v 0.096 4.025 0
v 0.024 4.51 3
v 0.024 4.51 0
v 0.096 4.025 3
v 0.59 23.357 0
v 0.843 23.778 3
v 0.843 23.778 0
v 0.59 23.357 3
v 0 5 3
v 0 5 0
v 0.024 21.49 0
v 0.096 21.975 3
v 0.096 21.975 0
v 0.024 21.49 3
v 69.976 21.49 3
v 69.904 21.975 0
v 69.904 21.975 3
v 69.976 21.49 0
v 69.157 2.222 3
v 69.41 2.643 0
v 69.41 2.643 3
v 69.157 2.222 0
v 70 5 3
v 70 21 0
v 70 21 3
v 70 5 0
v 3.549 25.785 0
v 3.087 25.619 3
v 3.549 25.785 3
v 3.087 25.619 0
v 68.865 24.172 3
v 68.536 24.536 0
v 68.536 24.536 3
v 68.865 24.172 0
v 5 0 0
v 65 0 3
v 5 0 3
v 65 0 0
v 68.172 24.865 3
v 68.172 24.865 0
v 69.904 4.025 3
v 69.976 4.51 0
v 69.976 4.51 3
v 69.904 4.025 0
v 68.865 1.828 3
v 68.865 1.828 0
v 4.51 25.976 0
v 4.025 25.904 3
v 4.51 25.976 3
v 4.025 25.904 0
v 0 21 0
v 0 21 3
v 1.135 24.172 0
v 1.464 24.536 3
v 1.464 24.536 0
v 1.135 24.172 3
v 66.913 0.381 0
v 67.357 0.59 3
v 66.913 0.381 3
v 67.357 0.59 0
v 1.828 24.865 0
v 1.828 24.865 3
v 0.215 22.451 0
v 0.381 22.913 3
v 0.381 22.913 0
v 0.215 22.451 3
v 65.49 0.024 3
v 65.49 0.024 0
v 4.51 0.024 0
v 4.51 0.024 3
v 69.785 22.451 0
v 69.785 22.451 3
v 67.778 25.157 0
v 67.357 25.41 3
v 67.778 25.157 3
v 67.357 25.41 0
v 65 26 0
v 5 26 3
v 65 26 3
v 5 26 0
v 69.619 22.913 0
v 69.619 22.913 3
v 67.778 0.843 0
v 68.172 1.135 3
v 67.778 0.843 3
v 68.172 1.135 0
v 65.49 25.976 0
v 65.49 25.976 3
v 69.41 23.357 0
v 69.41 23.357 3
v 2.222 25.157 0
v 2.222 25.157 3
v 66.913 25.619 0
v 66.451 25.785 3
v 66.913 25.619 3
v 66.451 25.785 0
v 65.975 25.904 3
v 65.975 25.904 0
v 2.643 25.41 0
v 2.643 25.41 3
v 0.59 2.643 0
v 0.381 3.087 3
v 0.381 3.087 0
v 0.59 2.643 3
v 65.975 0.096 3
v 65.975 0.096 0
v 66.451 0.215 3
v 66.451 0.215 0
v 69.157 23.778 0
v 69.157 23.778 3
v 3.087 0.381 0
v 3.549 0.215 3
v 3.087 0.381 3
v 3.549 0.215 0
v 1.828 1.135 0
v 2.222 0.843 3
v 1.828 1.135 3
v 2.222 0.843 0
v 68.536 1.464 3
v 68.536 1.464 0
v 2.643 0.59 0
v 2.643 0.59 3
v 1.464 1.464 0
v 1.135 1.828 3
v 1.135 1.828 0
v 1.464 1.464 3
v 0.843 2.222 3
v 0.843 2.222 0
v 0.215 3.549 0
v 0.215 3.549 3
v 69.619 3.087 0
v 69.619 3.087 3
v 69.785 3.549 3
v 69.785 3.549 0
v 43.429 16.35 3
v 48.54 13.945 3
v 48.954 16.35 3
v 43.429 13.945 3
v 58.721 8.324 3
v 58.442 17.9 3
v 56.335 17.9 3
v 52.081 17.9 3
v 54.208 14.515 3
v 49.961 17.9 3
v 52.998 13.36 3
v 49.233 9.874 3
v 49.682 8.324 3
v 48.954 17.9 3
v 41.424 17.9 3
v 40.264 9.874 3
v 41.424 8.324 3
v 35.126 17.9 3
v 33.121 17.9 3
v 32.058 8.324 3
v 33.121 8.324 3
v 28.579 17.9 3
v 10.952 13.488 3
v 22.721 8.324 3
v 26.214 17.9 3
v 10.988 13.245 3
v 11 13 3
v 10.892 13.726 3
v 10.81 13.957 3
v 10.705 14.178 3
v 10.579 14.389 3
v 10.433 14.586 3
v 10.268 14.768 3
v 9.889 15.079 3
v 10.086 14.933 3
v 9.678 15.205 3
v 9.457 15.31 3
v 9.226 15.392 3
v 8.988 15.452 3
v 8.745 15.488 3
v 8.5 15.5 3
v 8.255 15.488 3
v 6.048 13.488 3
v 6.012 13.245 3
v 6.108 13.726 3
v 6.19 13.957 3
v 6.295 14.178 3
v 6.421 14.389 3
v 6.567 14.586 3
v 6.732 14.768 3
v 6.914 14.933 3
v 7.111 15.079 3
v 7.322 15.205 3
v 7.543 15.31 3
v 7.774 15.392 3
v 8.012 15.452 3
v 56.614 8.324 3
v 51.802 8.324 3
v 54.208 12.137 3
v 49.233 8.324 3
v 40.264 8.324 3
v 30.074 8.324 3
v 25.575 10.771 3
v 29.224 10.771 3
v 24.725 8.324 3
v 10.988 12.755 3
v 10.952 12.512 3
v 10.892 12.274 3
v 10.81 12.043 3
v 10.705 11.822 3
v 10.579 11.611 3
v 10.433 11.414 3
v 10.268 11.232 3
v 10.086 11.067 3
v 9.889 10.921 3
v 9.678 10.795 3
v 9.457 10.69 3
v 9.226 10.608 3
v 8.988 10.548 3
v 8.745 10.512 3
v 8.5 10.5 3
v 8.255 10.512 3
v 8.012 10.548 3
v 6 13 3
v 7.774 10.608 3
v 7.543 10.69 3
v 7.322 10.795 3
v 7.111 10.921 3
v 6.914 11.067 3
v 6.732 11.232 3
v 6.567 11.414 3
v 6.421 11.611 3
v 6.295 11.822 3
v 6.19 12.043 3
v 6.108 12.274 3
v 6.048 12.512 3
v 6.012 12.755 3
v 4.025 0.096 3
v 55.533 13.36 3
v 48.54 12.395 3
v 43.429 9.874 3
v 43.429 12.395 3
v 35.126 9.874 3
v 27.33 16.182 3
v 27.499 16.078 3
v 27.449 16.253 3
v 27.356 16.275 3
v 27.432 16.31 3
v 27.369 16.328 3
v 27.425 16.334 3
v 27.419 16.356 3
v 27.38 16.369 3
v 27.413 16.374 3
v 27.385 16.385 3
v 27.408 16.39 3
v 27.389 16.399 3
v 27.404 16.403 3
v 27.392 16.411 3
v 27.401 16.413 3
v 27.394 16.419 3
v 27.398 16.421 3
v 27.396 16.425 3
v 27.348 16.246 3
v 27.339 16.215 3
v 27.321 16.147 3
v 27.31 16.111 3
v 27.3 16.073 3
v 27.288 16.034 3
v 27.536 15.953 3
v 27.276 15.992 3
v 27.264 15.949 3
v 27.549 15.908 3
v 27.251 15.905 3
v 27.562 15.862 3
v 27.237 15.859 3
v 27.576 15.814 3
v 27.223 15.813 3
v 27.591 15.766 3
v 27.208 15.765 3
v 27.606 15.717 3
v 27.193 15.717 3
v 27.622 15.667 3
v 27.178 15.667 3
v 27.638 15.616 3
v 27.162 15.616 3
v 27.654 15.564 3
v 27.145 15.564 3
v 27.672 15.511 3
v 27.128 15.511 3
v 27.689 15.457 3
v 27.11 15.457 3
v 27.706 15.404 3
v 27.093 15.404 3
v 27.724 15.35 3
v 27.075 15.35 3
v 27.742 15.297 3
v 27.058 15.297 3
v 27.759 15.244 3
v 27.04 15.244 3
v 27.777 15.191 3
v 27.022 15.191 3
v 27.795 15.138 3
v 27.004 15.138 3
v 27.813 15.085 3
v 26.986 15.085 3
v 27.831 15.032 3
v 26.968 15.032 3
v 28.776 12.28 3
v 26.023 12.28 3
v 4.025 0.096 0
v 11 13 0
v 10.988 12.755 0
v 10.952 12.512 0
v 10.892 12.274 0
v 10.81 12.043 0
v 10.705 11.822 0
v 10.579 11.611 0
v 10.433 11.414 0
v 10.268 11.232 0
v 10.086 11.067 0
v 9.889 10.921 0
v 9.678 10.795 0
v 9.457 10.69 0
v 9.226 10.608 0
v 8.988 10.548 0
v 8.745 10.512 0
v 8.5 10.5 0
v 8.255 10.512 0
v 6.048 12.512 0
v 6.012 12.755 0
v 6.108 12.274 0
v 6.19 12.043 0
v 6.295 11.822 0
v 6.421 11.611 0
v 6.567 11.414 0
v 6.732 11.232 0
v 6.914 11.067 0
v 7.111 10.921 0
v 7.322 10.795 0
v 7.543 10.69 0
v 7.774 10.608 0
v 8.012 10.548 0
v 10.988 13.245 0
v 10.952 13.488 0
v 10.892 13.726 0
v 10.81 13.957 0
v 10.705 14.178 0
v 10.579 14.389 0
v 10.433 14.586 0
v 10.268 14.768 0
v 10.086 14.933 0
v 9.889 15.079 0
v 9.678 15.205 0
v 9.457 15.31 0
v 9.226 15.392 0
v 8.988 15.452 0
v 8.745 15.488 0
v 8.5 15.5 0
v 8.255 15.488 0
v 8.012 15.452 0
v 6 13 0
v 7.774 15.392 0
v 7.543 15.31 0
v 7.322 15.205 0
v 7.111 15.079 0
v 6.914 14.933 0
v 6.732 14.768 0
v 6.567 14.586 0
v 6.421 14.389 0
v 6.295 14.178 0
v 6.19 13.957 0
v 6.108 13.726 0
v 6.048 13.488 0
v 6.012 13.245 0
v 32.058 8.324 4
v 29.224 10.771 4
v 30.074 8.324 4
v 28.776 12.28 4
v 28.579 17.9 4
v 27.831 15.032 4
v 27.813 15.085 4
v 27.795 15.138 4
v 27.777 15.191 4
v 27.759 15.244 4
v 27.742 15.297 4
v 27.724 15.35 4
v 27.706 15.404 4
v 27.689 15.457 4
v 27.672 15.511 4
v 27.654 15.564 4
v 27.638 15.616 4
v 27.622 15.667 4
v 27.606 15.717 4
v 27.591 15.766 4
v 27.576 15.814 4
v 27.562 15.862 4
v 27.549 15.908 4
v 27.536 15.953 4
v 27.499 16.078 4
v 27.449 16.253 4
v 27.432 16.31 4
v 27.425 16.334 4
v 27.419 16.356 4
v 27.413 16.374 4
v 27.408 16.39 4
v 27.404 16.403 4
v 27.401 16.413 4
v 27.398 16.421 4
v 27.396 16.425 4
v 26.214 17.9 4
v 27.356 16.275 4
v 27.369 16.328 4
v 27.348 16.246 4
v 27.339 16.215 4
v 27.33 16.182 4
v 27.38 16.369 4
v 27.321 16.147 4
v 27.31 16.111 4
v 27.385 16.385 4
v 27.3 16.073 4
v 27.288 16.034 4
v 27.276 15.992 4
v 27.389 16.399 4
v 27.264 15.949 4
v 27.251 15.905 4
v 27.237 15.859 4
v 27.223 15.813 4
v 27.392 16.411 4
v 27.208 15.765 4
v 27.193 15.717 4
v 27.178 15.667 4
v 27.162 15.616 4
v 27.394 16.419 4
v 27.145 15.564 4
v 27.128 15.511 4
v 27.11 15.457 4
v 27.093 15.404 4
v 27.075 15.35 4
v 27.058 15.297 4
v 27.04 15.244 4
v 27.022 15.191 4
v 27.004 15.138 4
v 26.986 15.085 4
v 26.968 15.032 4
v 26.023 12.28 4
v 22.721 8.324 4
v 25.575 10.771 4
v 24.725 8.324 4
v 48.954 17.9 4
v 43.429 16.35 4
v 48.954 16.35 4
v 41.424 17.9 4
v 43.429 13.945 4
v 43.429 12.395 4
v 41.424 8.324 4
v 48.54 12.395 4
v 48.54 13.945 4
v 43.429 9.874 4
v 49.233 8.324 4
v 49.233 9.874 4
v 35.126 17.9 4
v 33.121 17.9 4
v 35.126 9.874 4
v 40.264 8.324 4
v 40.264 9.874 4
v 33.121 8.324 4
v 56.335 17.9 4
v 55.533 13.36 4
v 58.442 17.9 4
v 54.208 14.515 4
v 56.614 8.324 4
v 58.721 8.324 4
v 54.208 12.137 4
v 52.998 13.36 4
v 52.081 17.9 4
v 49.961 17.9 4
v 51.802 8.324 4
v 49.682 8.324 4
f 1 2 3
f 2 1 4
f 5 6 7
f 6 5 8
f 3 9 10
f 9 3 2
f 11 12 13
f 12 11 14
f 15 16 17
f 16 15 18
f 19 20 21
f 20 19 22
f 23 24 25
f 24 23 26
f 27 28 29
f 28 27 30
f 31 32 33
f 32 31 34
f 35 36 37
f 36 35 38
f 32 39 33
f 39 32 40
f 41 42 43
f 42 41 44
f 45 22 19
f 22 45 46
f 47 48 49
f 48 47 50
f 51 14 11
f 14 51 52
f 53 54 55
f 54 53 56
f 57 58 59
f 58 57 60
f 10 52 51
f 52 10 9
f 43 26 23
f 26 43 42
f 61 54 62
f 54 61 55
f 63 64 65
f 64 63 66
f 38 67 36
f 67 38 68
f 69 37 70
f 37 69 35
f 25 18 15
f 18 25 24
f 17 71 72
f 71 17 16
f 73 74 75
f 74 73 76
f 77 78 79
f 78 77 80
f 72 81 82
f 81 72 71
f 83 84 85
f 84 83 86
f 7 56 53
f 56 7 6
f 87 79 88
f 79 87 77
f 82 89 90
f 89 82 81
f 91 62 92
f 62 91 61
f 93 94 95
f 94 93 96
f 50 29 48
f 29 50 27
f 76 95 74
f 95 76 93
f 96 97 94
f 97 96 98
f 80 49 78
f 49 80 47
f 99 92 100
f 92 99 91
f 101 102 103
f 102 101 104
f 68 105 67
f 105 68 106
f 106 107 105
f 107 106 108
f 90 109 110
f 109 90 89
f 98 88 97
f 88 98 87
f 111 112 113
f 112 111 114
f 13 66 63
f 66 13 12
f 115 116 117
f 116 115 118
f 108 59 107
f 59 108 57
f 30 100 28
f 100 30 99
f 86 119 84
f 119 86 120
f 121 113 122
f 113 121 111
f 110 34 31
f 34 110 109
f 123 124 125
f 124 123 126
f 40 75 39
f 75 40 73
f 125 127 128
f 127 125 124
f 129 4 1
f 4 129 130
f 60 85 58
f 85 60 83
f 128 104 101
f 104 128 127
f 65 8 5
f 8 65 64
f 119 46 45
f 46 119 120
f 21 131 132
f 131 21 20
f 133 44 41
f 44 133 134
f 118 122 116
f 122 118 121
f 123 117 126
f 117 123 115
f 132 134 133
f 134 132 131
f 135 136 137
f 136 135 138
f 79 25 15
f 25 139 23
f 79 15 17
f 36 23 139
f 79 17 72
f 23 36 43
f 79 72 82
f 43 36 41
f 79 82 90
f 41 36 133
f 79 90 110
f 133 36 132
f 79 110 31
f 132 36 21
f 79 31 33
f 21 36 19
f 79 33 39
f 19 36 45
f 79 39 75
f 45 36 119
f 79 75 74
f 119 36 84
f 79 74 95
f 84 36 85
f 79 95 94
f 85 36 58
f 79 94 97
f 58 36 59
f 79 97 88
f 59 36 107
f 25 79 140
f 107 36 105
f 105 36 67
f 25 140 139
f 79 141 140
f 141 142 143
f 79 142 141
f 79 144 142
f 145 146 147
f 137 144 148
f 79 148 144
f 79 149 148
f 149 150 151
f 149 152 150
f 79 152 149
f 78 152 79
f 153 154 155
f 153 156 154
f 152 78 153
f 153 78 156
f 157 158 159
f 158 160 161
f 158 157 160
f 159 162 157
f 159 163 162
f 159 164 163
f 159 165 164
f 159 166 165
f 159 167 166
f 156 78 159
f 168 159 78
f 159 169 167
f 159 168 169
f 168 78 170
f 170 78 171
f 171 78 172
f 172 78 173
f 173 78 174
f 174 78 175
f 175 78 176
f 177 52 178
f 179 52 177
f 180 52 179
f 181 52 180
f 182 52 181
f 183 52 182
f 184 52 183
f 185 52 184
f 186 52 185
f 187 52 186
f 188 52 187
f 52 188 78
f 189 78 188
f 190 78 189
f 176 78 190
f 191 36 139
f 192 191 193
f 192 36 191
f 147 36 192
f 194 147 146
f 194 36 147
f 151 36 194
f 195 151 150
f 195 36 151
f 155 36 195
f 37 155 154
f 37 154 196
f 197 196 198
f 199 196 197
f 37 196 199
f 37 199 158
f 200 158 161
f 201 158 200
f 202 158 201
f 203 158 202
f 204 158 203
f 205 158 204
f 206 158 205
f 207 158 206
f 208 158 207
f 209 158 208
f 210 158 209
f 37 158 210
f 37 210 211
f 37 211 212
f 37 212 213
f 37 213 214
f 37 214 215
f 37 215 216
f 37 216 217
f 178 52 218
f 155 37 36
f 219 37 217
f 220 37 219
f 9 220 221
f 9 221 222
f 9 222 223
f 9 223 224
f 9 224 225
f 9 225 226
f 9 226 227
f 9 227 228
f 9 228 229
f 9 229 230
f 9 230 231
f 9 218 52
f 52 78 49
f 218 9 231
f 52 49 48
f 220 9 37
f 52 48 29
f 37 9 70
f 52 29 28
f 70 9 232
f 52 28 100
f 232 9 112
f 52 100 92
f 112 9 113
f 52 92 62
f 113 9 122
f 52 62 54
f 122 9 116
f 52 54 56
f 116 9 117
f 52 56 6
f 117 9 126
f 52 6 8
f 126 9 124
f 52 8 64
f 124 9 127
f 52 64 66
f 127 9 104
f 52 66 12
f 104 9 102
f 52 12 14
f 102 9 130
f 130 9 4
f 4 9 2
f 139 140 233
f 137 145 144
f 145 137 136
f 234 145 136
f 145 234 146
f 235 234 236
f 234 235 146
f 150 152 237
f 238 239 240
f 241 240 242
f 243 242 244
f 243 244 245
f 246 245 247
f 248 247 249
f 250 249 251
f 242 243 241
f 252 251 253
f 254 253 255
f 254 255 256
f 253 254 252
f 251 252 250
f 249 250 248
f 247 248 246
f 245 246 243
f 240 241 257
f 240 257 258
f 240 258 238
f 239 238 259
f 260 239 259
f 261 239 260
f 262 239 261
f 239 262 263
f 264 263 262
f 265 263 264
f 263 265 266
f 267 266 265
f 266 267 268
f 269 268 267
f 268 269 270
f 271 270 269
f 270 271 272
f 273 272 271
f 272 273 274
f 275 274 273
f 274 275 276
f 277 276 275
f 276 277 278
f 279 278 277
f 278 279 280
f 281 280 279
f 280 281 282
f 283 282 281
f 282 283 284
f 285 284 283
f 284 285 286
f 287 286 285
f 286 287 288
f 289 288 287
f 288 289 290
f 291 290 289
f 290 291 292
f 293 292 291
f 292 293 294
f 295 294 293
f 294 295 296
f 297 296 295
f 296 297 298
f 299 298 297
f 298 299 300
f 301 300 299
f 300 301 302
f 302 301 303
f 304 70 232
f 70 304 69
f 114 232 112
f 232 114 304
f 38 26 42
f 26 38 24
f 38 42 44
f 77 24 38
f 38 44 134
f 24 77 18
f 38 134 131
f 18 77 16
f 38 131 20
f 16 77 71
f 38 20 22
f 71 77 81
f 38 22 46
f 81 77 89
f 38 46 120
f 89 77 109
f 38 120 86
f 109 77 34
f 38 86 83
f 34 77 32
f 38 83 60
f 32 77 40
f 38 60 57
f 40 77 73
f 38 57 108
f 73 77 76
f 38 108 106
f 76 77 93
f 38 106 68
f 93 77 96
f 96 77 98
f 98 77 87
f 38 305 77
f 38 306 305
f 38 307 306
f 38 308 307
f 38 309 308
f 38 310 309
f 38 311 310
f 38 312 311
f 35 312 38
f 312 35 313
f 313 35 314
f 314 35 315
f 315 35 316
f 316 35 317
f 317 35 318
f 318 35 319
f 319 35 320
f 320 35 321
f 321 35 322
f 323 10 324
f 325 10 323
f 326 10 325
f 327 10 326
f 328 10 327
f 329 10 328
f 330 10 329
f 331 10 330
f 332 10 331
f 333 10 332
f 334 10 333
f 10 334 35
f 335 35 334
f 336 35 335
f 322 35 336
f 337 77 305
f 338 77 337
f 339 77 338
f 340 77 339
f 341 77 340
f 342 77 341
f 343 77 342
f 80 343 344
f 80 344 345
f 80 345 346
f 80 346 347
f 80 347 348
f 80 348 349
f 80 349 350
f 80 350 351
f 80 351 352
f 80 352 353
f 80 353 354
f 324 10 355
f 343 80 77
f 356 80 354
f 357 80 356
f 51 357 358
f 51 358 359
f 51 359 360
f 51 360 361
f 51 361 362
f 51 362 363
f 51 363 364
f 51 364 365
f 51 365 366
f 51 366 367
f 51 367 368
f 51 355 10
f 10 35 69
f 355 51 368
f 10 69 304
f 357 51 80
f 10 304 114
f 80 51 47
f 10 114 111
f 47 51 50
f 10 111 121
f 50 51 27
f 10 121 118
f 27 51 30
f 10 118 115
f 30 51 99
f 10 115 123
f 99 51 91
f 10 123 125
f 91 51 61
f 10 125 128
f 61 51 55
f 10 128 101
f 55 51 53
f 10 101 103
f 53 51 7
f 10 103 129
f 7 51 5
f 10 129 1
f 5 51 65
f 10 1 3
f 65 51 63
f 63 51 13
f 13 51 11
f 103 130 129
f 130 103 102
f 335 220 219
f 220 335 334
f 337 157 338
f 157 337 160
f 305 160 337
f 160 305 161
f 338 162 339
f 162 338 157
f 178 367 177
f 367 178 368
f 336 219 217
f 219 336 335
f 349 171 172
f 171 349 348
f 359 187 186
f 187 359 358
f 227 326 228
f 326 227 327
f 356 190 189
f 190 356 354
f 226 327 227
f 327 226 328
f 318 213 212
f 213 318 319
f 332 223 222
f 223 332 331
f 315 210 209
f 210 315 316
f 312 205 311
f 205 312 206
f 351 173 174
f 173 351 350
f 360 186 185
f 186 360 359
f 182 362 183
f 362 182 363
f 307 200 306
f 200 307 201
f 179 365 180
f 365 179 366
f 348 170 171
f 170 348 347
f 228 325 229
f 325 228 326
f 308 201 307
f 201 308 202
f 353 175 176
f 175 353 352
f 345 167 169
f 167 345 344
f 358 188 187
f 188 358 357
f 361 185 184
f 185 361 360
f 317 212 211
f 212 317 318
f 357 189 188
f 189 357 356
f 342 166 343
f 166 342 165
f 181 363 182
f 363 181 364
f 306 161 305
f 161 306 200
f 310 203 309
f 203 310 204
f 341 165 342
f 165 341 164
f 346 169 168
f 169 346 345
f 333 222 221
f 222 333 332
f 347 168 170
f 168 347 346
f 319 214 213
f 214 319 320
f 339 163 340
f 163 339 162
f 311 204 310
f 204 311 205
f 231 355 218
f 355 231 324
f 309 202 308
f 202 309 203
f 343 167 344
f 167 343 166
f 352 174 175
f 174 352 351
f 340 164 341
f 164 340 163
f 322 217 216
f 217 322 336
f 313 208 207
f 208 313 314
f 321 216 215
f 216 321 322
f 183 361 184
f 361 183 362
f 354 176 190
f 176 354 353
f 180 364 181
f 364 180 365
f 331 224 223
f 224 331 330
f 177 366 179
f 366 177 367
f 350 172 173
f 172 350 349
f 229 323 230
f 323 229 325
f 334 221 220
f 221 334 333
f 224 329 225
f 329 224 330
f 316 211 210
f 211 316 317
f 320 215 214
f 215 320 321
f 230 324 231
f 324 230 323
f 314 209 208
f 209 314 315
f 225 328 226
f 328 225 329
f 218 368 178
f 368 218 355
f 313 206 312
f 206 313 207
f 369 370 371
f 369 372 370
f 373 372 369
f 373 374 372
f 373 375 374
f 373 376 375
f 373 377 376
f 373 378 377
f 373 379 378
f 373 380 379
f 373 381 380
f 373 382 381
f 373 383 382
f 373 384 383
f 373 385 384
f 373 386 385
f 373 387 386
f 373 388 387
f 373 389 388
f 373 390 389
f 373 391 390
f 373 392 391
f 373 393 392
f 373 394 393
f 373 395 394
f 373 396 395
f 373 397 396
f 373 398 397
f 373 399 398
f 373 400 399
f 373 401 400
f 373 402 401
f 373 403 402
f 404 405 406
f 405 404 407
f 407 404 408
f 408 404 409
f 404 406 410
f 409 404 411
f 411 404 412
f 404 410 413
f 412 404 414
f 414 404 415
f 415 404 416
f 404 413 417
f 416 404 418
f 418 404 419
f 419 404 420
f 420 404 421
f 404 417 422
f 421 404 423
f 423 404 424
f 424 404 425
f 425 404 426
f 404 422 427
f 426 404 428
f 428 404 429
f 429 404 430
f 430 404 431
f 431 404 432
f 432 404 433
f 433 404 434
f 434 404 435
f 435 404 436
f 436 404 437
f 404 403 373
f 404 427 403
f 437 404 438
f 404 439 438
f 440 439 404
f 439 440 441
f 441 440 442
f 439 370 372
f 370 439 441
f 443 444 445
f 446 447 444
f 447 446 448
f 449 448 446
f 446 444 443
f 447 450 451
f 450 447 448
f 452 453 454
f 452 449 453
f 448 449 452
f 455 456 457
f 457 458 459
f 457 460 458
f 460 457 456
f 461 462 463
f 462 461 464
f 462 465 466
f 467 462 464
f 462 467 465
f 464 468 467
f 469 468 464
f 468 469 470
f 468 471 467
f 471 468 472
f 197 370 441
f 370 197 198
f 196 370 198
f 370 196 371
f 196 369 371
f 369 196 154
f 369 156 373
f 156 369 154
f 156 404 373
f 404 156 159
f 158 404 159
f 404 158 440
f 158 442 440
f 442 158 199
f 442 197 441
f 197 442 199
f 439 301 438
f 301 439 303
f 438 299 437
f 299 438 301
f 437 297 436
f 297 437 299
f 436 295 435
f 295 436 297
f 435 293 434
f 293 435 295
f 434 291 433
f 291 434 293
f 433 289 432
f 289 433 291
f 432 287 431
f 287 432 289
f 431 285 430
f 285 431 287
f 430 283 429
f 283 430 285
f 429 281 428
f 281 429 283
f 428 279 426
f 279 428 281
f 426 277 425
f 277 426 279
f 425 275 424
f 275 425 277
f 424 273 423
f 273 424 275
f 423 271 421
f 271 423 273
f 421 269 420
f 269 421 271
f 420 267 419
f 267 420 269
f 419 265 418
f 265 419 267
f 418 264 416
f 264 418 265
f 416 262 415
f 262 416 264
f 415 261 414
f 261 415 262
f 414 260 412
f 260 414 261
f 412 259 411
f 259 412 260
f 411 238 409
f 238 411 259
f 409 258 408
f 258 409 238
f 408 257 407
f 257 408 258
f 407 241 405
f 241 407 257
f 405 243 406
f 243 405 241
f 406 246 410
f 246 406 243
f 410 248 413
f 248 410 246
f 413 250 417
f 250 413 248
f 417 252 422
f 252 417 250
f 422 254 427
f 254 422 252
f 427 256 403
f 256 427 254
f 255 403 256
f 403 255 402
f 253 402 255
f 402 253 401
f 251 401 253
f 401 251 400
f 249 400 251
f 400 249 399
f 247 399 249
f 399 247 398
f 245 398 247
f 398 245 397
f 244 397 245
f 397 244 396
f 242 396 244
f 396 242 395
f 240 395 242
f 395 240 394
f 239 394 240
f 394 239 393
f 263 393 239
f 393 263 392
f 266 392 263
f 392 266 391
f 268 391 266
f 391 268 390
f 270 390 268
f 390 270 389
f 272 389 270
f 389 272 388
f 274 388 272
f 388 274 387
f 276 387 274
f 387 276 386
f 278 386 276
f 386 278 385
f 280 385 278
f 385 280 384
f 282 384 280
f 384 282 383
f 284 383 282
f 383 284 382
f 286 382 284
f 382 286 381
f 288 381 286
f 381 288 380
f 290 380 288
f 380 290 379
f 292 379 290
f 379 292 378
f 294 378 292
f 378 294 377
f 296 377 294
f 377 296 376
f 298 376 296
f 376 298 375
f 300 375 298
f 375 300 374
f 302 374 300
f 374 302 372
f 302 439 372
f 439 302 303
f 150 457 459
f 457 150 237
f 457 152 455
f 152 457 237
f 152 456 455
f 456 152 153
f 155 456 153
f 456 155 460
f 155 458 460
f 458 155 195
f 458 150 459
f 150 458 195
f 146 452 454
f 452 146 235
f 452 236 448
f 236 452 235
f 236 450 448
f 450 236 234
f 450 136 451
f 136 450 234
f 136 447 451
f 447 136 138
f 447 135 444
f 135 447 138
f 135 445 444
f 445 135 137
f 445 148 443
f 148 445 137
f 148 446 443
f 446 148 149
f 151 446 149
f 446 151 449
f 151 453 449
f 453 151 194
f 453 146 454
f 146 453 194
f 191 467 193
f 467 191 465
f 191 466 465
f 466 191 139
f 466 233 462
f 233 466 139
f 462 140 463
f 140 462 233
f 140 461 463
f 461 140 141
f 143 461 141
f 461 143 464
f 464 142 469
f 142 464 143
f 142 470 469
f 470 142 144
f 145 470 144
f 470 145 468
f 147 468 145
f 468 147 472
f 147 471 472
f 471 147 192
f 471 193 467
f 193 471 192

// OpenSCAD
// Name tag: a rounded tag with raised letters and a hole for a key ring or bag strap.
// Print the letters in a second colour by pausing at the letter height, or use the multi-colour unit.

/* [Text] */
// Text
name = "ALEX";
// Letter size (mm)
text_size = 10; // [6:0.5:18]
// Font
font = "Liberation Sans:style=Bold";

/* [Tag] */
// Width (mm)
width = 70; // [40:1:120]
// Height (mm)
height = 26; // [18:1:50]
// Thickness (mm)
thickness = 3; // [2:0.2:6]
// Raised letters (mm)
letter_height = 1; // [0.6:0.2:2]
// Ring hole (mm)
hole_d = 5; // [3:0.5:8]

/* [Hidden] */
$fn = $preview ? 32 : 64;
r = 5;
hole_x = r + hole_d / 2 + 1;

difference() {
  color("white") linear_extrude(thickness) hull() for (x = [r, width - r], y = [r, height - r]) translate([x, y]) circle(r);
  translate([hole_x, height / 2, -1]) cylinder(d = hole_d, h = thickness + 2);
}
color("red") translate([hole_x + hole_d / 2 + (width - hole_x - hole_d / 2) / 2, height / 2, thickness - 0.01])
  linear_extrude(letter_height + 0.01)
    resize([min(width - hole_x - hole_d - 8, len(name) * text_size * 0.9), 0], auto = [true, true])
      text(name, size = text_size, font = font, halign = "center", valign = "center");
